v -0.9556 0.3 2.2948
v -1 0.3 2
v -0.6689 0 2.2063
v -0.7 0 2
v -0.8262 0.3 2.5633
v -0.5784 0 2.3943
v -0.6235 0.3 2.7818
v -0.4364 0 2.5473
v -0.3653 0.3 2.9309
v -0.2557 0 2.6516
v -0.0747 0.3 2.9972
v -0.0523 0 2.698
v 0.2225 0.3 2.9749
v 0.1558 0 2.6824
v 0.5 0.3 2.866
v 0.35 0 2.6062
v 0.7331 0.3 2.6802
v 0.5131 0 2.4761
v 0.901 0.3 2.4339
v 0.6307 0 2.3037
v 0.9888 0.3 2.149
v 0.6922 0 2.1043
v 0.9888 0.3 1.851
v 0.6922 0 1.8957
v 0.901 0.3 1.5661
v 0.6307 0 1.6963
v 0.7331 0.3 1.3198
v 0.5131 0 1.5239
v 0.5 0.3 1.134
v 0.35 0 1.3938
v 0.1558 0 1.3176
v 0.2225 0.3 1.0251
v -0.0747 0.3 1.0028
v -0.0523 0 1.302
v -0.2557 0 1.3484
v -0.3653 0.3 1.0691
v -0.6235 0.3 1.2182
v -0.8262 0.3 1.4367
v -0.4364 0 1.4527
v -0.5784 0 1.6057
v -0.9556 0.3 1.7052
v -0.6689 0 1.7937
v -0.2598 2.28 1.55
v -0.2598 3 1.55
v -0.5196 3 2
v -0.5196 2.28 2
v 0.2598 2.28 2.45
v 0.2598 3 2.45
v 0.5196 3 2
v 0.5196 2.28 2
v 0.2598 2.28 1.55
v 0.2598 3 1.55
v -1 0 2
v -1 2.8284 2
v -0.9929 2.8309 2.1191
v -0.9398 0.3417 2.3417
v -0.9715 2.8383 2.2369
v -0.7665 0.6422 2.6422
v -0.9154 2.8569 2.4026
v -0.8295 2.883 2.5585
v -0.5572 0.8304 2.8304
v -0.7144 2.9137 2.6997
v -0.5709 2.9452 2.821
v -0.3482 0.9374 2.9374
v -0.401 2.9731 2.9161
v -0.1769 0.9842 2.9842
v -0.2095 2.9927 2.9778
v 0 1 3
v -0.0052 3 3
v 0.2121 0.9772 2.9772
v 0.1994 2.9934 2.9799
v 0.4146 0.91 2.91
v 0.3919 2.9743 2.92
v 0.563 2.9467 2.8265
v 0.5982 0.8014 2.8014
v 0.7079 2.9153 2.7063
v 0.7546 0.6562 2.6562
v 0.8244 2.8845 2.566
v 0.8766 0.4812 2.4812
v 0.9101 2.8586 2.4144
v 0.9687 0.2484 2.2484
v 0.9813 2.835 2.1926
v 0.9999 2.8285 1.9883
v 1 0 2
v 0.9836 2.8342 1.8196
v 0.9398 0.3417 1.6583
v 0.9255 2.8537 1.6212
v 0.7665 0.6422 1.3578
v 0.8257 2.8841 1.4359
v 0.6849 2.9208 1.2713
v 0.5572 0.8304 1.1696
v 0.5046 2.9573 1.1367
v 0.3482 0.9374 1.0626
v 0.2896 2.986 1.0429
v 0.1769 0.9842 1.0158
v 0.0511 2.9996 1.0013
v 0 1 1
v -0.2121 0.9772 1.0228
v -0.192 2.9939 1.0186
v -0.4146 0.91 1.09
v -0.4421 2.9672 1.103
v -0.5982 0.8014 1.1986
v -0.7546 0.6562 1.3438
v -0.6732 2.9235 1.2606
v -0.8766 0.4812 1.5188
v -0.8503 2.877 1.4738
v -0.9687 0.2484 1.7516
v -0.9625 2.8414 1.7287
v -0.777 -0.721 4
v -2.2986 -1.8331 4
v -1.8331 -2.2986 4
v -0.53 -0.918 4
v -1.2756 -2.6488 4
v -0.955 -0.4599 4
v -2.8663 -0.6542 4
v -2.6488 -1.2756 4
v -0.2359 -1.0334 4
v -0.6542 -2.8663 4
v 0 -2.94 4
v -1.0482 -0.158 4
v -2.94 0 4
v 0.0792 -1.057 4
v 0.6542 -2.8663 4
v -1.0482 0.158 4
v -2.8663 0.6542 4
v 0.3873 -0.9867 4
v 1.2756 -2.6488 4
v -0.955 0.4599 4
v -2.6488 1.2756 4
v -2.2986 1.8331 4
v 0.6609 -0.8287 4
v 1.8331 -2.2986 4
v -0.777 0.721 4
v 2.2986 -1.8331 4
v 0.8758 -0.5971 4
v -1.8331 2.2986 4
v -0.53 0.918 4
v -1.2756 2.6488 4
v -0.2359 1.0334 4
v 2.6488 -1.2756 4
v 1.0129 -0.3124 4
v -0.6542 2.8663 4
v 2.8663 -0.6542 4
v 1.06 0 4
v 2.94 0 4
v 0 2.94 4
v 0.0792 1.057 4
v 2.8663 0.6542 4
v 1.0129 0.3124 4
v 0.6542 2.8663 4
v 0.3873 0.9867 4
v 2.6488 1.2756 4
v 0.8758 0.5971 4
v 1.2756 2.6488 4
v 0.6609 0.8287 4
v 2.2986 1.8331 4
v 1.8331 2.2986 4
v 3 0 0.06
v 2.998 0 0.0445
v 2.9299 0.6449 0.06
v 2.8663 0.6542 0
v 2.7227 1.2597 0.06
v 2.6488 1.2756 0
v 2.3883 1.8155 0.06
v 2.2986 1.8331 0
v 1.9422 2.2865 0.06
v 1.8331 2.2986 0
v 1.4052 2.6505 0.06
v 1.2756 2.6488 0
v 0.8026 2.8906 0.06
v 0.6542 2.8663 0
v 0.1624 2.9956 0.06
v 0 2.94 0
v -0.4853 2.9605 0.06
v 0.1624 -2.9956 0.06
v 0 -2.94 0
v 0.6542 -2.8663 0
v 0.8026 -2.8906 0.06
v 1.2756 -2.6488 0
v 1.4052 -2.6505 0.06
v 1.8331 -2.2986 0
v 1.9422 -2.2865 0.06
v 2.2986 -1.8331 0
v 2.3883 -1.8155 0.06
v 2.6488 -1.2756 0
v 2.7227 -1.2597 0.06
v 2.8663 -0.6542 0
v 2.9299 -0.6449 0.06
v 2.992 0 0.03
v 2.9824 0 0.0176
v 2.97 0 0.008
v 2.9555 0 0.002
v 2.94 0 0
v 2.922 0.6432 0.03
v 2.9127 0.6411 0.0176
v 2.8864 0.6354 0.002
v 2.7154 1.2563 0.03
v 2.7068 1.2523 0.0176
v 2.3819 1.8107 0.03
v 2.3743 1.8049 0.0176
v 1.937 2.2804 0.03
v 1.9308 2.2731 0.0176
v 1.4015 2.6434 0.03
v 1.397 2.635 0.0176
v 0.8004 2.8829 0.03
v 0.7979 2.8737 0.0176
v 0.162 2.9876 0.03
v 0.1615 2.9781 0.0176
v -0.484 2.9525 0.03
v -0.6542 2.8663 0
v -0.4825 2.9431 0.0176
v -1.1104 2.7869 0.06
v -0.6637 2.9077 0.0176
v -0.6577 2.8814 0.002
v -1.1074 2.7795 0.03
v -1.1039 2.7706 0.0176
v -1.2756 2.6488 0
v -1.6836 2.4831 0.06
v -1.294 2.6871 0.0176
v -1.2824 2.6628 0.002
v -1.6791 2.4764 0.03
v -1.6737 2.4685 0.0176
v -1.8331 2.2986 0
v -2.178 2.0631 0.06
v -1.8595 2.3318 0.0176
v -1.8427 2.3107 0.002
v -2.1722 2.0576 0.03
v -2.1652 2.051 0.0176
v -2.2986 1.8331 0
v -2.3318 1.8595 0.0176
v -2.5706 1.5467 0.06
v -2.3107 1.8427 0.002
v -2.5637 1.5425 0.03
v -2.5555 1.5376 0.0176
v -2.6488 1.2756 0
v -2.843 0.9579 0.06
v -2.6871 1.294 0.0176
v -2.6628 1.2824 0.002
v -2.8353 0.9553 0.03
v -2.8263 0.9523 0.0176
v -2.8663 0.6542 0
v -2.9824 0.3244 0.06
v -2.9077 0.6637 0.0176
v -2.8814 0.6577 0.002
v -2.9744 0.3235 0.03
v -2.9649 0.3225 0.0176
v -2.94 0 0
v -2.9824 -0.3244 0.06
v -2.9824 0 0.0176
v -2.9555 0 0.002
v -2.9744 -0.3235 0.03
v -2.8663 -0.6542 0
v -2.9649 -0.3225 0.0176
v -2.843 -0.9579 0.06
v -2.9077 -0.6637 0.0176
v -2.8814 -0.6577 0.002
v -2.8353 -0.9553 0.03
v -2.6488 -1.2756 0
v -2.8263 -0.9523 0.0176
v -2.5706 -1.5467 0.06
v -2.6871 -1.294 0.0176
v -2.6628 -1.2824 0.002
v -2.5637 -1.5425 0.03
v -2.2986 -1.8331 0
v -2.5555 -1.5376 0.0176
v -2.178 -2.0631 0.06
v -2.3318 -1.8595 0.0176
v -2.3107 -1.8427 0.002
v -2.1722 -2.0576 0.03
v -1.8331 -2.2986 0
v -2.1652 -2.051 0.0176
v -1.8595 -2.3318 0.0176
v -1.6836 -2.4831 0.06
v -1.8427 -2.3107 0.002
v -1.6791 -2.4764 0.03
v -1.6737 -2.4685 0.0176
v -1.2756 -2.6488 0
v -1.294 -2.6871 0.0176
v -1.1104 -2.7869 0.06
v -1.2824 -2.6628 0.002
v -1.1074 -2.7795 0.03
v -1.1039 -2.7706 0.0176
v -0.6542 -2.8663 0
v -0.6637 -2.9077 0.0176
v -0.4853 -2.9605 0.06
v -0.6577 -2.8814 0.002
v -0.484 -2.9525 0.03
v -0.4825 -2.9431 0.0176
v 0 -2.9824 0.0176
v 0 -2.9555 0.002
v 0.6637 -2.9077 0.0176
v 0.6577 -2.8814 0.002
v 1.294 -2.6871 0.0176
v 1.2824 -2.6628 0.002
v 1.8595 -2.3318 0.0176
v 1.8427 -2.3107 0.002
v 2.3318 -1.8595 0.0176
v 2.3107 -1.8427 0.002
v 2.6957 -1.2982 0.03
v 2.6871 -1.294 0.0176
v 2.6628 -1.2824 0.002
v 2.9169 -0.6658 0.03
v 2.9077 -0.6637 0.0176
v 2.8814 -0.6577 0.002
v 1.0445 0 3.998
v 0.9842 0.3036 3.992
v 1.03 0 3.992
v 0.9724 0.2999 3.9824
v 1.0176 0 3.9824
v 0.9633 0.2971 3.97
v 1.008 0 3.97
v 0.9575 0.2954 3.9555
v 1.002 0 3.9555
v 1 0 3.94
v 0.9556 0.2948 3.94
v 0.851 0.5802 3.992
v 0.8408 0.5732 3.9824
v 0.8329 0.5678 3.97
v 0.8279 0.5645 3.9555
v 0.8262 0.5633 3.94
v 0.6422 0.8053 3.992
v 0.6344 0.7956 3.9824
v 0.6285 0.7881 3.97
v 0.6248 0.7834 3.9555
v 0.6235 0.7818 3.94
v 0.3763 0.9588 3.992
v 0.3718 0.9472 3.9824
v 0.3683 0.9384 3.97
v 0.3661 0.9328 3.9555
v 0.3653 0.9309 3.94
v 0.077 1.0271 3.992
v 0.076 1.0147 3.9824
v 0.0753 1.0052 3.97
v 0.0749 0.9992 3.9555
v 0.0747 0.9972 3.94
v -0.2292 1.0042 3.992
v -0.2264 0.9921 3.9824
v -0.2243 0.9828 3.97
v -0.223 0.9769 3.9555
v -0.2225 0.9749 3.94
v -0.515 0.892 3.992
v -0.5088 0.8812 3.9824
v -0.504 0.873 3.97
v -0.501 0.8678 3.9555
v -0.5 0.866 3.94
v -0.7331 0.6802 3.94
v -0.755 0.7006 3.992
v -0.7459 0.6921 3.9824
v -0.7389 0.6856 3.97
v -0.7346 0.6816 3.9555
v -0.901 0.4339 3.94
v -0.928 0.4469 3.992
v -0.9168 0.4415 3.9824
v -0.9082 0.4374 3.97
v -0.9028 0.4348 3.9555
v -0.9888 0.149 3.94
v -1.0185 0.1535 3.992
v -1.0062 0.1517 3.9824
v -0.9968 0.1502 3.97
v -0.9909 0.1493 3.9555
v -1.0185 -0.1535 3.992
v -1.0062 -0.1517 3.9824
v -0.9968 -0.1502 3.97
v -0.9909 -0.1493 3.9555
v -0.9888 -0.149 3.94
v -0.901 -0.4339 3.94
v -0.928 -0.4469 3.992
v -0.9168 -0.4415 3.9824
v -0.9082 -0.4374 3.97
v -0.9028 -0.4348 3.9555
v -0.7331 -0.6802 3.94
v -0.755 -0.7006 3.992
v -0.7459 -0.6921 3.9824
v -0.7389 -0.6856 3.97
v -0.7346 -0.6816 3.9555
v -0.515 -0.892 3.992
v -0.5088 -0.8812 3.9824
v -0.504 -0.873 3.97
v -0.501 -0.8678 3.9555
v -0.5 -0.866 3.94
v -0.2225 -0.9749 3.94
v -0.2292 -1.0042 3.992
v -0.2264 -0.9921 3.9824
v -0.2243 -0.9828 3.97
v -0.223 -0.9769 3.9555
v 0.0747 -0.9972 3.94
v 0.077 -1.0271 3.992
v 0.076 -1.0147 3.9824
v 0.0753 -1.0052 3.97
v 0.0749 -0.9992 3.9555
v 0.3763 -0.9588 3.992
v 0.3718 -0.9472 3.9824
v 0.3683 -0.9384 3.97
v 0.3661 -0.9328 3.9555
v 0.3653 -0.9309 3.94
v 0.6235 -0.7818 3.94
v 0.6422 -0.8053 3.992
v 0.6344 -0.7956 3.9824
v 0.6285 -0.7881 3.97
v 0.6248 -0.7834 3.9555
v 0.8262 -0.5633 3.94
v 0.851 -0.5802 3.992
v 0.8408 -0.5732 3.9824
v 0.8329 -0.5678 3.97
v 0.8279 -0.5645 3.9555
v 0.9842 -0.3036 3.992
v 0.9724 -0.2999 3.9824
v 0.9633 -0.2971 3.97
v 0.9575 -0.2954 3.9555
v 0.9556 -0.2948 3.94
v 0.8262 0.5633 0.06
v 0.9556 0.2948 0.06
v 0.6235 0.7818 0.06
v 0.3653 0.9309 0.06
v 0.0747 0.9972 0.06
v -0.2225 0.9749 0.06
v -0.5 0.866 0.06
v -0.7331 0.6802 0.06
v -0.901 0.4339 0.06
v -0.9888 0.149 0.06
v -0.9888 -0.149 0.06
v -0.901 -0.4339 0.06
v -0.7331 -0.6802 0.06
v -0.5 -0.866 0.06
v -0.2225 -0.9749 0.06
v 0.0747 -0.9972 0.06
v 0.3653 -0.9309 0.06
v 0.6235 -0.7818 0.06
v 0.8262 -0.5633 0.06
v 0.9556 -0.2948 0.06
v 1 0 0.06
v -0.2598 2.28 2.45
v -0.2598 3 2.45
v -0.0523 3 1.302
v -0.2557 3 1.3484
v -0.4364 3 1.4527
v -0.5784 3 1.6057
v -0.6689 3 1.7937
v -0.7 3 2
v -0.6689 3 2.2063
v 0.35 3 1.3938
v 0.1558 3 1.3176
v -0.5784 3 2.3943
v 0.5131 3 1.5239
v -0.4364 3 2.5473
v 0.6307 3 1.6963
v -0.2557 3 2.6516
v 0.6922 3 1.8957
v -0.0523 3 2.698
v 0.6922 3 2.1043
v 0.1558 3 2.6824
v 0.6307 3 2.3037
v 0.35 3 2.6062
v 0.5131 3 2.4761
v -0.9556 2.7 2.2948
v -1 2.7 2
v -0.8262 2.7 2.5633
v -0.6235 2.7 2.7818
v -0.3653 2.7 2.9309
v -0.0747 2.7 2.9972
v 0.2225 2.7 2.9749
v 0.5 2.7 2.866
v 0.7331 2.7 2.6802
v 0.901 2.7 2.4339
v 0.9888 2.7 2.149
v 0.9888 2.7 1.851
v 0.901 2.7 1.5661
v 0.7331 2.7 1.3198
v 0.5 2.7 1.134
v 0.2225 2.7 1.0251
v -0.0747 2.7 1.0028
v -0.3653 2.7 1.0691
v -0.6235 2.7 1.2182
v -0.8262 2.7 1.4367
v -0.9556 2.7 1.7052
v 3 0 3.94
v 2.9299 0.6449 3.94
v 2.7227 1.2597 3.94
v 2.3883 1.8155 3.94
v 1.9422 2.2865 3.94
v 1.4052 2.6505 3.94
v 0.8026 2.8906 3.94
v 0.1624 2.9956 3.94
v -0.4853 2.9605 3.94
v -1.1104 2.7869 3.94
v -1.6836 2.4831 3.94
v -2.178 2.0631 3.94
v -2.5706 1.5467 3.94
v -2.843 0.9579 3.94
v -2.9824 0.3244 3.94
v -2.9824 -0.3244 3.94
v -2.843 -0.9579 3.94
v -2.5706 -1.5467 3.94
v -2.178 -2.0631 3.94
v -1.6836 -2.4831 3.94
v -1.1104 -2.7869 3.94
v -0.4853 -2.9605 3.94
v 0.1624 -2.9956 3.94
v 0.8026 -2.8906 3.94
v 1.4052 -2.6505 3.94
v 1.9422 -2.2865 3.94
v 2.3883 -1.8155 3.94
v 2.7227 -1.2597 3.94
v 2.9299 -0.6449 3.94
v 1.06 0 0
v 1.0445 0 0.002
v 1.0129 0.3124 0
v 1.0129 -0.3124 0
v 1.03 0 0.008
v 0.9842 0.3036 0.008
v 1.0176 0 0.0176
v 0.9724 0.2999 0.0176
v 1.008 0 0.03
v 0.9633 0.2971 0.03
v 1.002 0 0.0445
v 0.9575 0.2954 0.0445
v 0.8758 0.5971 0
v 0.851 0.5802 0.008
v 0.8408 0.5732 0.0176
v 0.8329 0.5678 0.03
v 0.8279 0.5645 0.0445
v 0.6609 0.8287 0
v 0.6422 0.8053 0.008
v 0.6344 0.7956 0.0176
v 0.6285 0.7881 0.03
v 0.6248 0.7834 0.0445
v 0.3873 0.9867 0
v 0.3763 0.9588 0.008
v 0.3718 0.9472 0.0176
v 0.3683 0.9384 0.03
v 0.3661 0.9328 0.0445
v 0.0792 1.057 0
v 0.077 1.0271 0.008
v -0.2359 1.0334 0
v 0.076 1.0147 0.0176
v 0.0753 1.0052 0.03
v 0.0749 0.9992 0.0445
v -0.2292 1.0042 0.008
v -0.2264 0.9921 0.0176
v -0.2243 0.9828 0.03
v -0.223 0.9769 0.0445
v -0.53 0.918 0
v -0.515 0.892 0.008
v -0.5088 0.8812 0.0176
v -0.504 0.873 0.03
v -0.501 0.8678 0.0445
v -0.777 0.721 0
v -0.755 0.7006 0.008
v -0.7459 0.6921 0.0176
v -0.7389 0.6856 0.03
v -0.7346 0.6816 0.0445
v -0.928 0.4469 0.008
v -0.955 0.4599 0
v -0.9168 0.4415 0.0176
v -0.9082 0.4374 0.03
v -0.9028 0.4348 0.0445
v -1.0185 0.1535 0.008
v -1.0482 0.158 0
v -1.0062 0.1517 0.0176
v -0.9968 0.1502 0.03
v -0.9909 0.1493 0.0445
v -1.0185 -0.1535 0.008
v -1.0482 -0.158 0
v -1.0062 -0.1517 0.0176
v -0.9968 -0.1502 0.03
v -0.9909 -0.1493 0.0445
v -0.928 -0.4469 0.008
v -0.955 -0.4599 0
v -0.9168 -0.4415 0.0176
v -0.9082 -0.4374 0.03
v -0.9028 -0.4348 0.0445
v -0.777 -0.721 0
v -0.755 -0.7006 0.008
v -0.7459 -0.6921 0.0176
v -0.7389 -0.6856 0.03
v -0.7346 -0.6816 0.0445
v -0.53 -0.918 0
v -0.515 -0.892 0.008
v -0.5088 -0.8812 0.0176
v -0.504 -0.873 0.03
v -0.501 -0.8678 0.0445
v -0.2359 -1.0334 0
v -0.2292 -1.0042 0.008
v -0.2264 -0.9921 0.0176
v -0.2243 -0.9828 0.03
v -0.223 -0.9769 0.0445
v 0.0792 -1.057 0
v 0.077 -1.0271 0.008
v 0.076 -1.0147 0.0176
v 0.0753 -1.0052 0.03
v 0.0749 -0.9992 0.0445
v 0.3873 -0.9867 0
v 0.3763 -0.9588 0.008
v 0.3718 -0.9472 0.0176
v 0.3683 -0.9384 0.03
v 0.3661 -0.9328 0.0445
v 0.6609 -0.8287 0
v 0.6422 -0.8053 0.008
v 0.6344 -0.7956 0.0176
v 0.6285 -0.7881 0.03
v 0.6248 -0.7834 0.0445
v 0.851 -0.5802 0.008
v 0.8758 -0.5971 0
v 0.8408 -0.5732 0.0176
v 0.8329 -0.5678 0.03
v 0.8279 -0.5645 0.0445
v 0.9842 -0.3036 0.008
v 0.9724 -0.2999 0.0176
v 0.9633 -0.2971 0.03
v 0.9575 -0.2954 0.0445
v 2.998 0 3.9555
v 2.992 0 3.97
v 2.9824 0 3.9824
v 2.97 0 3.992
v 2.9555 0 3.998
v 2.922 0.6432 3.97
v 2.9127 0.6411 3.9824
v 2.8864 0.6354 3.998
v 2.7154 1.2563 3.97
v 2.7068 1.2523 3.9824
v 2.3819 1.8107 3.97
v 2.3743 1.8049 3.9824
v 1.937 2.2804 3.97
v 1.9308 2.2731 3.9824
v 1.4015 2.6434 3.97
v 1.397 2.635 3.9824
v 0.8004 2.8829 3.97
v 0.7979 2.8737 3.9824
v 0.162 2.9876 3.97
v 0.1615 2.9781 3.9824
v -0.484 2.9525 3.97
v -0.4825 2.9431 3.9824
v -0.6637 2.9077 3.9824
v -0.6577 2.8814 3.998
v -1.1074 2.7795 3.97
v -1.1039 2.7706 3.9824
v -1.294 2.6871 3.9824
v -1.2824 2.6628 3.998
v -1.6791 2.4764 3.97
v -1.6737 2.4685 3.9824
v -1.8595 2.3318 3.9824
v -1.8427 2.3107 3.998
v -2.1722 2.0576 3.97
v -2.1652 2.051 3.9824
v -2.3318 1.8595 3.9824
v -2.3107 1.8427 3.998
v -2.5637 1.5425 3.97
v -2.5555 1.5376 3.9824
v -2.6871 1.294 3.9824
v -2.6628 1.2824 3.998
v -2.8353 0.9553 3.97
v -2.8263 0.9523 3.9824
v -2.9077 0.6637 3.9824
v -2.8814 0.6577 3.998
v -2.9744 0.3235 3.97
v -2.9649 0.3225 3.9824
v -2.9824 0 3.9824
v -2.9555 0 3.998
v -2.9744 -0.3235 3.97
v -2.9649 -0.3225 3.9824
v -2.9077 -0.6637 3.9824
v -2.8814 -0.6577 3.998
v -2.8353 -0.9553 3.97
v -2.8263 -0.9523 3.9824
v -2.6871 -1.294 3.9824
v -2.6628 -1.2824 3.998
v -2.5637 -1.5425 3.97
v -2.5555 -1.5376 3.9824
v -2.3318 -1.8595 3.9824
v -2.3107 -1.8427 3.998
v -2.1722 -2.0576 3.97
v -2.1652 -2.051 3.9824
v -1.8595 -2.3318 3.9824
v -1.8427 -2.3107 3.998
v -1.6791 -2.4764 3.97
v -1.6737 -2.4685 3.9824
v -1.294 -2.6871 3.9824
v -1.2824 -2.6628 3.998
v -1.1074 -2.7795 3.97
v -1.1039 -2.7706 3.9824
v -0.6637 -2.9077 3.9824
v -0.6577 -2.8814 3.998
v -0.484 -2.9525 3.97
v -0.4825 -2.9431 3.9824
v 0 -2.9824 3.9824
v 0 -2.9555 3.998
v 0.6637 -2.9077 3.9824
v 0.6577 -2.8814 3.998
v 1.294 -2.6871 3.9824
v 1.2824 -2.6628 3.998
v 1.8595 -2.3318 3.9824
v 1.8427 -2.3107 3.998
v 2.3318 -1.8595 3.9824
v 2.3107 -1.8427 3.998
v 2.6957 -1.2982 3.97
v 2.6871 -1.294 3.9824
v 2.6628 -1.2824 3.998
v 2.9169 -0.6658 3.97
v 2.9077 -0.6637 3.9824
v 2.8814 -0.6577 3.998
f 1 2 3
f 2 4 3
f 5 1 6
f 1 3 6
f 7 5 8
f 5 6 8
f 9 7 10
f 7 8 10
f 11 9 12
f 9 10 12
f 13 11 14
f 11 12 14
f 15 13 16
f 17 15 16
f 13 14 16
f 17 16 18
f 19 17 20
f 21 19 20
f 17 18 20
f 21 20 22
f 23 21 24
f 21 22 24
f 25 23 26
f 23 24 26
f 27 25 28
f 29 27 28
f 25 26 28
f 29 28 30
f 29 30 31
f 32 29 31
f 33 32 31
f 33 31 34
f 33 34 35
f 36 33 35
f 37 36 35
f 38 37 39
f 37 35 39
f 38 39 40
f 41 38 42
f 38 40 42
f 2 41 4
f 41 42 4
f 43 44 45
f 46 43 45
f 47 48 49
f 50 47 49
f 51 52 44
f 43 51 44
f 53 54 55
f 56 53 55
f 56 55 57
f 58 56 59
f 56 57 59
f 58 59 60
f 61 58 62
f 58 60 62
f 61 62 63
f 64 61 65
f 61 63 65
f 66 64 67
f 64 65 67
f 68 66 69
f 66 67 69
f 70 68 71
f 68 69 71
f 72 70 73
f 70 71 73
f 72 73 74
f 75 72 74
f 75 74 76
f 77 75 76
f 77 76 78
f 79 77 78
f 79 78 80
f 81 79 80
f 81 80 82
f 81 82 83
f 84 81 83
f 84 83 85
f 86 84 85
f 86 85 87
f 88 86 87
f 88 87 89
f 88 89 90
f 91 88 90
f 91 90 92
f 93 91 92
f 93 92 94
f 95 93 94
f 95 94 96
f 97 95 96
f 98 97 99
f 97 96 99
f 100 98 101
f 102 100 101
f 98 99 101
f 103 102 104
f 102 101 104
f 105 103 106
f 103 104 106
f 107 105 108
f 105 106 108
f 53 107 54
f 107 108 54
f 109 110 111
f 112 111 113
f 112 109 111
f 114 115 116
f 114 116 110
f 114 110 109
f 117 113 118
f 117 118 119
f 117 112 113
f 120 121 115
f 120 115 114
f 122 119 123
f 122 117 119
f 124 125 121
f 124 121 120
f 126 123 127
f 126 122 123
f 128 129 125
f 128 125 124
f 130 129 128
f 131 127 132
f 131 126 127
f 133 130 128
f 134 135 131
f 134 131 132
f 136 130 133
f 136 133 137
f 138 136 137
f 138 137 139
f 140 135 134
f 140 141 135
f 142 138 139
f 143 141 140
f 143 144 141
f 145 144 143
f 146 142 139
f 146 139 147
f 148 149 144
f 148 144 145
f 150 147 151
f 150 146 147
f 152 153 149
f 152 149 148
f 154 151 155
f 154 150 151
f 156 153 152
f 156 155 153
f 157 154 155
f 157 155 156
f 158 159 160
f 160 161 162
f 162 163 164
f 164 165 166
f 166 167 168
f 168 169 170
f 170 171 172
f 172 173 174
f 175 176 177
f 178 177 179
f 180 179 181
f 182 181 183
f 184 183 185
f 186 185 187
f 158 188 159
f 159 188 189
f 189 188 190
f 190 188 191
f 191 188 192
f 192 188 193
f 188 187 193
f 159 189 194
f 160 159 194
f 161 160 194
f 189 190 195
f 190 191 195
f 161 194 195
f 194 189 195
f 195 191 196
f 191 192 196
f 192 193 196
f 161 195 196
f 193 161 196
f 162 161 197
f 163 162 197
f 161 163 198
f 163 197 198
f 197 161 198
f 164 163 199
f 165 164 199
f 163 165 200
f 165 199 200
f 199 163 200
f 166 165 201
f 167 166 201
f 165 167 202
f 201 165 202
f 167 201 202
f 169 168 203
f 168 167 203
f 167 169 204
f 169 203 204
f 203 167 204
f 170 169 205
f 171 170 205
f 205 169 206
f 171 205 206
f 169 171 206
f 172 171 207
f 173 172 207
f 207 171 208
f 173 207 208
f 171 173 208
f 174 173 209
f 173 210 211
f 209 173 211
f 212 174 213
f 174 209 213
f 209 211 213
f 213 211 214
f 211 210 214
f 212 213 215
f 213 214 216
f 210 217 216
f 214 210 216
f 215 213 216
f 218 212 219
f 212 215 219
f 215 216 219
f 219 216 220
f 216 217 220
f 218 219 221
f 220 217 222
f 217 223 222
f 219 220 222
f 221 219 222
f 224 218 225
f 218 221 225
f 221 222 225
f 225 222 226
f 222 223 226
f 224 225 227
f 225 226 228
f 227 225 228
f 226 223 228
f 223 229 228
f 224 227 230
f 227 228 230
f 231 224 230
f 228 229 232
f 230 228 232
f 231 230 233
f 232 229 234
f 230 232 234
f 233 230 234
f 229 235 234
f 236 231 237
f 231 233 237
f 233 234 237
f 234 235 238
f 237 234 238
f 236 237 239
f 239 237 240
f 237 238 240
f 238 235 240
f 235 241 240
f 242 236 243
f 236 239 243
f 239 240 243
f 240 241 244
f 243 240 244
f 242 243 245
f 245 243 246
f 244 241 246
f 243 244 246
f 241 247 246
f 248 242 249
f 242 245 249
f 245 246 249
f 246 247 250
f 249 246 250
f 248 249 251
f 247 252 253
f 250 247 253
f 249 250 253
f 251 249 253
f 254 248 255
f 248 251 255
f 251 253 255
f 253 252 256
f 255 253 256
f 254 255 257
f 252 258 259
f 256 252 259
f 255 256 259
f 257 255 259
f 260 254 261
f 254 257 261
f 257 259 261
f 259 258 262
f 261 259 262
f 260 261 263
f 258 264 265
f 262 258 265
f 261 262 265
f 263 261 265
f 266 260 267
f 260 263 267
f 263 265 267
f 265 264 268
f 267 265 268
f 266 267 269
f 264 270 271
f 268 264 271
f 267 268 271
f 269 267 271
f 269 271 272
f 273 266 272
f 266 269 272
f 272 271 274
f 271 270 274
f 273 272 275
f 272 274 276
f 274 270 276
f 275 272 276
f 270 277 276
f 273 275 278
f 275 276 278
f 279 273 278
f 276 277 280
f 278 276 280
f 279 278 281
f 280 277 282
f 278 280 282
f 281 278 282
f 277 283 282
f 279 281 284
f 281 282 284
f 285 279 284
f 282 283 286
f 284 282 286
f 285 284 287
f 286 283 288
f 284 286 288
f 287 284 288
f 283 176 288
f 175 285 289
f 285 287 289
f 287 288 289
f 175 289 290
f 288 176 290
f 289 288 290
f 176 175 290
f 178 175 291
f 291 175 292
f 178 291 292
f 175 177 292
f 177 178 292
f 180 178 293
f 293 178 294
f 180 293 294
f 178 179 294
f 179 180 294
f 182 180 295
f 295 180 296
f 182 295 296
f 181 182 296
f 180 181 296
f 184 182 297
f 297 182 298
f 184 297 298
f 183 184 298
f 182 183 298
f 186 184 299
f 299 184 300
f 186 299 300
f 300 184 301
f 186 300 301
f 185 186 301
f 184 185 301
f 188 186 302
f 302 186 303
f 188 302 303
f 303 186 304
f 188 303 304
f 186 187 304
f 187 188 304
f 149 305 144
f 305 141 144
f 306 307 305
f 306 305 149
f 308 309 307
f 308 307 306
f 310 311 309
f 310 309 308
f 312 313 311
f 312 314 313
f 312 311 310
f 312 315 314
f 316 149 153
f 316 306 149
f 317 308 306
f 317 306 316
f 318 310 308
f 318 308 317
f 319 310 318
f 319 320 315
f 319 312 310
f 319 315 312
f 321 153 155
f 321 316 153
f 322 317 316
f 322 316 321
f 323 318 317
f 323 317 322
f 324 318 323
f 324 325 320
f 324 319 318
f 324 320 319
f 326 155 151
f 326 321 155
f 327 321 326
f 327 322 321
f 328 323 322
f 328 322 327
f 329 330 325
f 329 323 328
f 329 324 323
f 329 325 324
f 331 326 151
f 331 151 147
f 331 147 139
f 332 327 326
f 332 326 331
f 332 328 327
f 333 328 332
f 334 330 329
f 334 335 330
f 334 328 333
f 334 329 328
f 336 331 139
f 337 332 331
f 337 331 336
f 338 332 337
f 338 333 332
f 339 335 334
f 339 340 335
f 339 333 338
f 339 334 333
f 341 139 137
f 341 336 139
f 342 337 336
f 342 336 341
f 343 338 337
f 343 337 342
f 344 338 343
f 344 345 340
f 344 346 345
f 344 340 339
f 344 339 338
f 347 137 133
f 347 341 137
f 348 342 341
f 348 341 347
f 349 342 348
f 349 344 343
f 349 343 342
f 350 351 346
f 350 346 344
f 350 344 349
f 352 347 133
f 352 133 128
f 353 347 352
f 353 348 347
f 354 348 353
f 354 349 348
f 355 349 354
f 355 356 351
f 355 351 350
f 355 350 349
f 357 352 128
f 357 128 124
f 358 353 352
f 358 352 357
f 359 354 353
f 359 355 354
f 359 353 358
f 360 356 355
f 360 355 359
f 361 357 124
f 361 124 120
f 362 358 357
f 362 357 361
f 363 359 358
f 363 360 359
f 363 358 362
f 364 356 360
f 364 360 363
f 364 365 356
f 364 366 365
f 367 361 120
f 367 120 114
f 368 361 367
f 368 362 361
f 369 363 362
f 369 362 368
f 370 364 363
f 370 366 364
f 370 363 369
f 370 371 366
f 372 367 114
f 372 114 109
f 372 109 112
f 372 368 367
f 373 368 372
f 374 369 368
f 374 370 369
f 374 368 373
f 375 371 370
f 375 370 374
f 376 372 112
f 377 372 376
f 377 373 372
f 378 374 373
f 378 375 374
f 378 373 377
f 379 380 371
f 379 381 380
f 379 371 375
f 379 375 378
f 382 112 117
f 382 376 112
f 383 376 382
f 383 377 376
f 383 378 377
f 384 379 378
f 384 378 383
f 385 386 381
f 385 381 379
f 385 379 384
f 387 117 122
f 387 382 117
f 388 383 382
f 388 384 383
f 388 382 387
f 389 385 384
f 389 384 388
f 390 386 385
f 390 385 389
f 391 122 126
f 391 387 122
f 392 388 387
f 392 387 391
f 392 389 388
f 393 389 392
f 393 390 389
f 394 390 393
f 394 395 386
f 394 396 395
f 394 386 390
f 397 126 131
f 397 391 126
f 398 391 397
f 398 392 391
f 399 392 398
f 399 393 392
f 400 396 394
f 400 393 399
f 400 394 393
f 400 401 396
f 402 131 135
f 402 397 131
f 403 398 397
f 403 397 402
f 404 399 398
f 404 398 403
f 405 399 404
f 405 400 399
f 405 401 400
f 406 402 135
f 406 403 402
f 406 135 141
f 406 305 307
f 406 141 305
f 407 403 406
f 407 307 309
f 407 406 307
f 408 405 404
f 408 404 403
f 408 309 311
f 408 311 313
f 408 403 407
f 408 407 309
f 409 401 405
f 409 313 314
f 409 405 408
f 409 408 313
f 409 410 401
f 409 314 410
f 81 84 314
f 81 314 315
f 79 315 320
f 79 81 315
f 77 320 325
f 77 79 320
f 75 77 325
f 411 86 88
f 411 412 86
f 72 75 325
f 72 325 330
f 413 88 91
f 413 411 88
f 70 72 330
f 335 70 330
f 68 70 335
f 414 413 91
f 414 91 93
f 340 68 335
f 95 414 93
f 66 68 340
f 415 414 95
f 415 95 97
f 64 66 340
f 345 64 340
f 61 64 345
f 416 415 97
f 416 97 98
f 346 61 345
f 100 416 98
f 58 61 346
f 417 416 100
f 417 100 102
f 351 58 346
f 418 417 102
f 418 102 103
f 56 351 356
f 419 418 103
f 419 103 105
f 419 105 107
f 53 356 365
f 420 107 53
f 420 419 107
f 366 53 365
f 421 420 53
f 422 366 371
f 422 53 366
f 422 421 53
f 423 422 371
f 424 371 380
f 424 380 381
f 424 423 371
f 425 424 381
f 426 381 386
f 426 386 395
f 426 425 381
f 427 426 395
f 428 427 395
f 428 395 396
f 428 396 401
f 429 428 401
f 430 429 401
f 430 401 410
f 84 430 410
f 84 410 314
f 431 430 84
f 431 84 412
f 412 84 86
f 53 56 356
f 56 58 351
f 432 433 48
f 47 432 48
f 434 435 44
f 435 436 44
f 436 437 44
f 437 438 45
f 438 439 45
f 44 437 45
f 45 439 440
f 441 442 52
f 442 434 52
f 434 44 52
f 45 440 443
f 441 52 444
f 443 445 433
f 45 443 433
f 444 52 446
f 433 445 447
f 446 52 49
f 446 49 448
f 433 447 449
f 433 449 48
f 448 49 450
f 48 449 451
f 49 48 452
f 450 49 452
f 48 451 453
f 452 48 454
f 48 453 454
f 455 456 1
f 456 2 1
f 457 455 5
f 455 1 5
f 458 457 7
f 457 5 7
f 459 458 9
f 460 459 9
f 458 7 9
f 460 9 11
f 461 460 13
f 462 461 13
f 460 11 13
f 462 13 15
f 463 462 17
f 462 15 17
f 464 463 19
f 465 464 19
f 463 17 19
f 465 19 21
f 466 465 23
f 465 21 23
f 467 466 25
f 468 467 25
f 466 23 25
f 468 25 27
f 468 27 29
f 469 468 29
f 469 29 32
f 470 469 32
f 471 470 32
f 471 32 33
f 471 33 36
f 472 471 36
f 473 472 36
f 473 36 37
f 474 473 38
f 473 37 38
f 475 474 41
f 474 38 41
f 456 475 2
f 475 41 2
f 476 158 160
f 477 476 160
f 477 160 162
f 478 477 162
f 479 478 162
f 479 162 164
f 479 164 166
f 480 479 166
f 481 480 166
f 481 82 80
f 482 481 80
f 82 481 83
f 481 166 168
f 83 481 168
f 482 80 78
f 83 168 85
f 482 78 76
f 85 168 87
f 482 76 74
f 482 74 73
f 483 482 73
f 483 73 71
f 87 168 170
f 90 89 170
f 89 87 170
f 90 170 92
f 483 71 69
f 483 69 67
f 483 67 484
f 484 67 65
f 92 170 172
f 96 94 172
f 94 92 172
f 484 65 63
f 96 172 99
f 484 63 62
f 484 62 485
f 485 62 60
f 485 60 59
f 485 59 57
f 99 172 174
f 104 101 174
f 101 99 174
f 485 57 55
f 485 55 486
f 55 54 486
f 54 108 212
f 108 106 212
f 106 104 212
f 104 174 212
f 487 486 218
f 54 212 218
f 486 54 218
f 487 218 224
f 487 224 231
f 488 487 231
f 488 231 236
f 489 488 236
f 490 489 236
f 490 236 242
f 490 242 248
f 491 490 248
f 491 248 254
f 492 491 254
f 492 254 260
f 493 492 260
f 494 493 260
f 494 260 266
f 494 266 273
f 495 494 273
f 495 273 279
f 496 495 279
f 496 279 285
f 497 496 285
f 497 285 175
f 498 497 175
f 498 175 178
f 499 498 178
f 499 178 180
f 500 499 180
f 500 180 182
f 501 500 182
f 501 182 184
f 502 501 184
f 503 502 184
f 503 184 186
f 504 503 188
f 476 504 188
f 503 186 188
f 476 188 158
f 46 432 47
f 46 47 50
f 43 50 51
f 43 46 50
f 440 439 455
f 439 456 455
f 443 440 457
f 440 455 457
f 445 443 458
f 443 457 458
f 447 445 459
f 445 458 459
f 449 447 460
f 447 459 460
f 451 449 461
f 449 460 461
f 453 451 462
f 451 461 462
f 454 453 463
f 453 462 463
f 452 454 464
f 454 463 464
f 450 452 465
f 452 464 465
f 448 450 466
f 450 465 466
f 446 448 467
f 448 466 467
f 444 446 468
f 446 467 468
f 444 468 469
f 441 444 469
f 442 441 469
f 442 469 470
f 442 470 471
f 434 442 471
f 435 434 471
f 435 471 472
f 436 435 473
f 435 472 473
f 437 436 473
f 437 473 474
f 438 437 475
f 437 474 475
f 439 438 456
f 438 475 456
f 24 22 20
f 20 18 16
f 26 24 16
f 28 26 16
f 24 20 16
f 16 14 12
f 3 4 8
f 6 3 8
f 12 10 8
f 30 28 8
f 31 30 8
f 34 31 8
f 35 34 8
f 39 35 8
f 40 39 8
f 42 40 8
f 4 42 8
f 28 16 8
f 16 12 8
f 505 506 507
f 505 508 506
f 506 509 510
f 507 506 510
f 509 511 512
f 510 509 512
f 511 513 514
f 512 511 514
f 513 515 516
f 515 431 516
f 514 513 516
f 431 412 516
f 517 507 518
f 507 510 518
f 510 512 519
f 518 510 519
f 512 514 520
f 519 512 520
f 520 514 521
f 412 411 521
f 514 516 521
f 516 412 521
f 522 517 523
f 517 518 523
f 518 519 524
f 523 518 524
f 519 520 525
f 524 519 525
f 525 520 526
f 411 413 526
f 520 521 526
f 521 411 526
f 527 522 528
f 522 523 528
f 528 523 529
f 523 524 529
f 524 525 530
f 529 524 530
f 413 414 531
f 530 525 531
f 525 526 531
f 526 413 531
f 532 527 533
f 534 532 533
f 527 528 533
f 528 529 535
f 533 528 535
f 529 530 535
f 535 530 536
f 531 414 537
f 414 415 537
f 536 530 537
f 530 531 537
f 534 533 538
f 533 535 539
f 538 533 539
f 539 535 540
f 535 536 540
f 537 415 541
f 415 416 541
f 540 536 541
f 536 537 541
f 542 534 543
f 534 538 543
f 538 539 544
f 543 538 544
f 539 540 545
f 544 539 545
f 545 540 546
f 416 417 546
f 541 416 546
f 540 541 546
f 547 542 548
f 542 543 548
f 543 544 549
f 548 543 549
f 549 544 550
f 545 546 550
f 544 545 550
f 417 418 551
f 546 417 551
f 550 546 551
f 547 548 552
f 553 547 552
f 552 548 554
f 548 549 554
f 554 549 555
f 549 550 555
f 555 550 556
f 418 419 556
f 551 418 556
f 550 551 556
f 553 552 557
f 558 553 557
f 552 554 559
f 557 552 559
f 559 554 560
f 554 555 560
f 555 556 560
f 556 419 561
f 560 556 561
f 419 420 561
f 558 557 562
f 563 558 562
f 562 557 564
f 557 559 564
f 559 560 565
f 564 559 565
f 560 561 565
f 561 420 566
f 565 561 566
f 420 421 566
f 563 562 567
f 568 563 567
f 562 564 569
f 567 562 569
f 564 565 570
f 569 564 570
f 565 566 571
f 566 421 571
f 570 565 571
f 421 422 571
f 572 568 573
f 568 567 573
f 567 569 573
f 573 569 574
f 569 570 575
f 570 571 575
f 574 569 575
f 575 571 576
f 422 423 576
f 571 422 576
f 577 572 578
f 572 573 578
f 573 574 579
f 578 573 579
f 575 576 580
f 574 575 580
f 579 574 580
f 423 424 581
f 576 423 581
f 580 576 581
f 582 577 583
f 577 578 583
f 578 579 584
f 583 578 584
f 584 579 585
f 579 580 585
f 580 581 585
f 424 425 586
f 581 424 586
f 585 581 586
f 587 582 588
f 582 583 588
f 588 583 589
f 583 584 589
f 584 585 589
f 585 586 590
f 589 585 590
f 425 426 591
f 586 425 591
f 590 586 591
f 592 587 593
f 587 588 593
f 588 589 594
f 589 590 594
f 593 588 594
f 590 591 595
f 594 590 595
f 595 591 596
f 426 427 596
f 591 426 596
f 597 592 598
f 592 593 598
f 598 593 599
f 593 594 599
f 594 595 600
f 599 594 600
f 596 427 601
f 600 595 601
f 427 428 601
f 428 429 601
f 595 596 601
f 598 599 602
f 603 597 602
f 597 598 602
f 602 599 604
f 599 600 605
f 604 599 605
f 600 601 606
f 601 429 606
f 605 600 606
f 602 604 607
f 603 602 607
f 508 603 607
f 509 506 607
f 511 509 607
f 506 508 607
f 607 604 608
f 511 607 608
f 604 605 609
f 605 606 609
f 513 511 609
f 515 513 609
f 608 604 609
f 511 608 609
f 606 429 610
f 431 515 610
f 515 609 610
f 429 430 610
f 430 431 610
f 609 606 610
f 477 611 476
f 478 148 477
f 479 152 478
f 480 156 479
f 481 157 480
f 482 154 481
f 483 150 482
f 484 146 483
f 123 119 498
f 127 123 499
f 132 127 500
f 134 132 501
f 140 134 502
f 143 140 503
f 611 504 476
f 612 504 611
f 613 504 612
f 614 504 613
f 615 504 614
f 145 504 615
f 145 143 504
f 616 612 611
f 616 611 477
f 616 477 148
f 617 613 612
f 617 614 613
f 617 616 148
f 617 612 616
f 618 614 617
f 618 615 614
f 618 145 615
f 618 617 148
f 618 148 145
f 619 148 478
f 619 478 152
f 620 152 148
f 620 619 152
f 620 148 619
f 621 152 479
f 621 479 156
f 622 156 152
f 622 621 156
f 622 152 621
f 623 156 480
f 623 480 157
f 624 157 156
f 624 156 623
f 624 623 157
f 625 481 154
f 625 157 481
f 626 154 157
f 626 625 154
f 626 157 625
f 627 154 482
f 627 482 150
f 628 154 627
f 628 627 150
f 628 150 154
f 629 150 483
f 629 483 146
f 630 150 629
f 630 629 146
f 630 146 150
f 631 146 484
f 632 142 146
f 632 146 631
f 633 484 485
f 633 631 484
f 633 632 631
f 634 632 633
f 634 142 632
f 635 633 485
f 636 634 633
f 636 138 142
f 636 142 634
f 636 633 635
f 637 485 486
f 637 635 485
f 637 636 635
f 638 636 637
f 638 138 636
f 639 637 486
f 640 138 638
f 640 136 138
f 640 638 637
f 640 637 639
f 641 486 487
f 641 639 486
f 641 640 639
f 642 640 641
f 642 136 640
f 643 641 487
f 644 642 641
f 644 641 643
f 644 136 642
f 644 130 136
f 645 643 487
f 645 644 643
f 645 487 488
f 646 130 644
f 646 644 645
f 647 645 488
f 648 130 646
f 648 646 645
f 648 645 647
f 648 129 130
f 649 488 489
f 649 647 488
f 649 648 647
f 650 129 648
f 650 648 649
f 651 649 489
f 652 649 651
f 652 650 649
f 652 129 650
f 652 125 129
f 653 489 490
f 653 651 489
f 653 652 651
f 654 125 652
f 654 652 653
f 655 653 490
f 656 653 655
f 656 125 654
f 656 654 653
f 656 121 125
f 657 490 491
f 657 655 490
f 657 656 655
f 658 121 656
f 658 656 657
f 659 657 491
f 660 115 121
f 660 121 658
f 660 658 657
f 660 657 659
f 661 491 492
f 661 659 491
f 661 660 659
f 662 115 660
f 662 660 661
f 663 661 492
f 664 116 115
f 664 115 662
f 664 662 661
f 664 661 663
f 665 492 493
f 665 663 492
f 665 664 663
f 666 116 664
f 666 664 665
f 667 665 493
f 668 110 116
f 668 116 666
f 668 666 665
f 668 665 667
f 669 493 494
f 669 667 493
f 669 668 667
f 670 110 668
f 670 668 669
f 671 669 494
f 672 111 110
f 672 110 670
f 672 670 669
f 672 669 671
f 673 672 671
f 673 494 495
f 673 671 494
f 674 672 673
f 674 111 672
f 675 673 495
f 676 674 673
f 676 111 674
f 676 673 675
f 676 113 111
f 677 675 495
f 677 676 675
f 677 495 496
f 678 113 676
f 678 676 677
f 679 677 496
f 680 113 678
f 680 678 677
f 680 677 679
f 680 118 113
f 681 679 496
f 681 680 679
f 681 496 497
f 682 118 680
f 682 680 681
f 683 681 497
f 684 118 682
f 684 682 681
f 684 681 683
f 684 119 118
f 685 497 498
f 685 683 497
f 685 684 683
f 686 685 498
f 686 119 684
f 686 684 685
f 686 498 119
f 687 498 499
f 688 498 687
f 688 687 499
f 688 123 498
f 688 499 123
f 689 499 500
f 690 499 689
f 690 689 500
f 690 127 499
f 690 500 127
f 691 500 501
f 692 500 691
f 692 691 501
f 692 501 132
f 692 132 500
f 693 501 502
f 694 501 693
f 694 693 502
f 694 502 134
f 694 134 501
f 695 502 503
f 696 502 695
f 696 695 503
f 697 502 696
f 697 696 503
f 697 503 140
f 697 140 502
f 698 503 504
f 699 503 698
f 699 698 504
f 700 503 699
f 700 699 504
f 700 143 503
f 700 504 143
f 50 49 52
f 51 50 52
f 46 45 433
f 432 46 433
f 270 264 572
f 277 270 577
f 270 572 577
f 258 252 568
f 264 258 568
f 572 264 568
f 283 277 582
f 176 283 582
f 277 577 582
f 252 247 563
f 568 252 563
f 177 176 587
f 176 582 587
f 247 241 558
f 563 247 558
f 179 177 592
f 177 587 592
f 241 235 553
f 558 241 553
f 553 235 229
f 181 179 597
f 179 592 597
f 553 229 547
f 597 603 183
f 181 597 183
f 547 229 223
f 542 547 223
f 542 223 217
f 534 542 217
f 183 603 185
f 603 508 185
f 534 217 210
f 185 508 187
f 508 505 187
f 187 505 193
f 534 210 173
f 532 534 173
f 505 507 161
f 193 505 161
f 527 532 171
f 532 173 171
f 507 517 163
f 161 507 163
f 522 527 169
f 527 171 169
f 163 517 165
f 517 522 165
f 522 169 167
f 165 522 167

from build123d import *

# Parameters (mm, degrees)
SKETCH1_R          = 3
SKETCH1_R_2        = 1
EXTRUDE1_DEPTH     = 4
CUT_EXTRUDE1_REACH = 8
SKETCH2_R          = 1
CUT_EXTRUDE2_DEPTH = 0.72
FILLET1_R          = 0.06


with BuildPart() as part:
    # Sketch1 → Extrude1 (new body)
    with BuildSketch(Plane.XY):
        Circle(SKETCH1_R)
        Circle(SKETCH1_R_2, mode=Mode.SUBTRACT)
    extrude(amount=EXTRUDE1_DEPTH)

    # Sketch2 → Cut-Extrude1 (cut, up to next)
    with BuildSketch(Plane(origin=(0, 3, 0), x_dir=(-1, 0, 0), z_dir=(0, 1, 0)), mode=Mode.PRIVATE) as cut_extrude1_sk1:
        with Locations((0, 2)):
            Circle(SKETCH2_R)
    cut_extrude1_tool1 = extrude(cut_extrude1_sk1.sketch, amount=-CUT_EXTRUDE1_REACH, mode=Mode.PRIVATE) & part.part
    add(cut_extrude1_tool1.solids().sort_by_distance((0, 3, 2))[0], mode=Mode.SUBTRACT)

    # Fillet1
    fillet1_edges = [part.edges().sort_by_distance(p)[0] for p in [
        (-3, 0, 0),
        (-3, 0, 4),
        (-1, 0, 0),
        (-1, 0, 4),
    ]]
    fillet(fillet1_edges, radius=FILLET1_R)


with BuildPart() as body_2:
    # Sketch3 → Revolve1 (revolve)
    with BuildSketch(Plane.XY.offset(2)):
        Polygon((-0.7, 3), (-1, 2.7), (-1, 0.3), (-0.7, 0), (0, 0), (0, 3), align=None)
    revolve(axis=Axis((0, 0, 2), (0, 1, 0)))

    # Sketch4 → Cut-Extrude2 (cut)
    with BuildSketch(Plane(origin=(0, 3, 0), x_dir=(0, 0, -1), z_dir=(0, 1, 0))):
        Polygon((-2, 0.519615242), (-2.45, 0.259807621), (-2.45, -0.259807621), (-2, -0.519615242), (-1.55, -0.259807621), (-1.55, 0.259807621), align=None)
    extrude(amount=-CUT_EXTRUDE2_DEPTH, mode=Mode.SUBTRACT)


solid = Compound([part.part, body_2.part])
